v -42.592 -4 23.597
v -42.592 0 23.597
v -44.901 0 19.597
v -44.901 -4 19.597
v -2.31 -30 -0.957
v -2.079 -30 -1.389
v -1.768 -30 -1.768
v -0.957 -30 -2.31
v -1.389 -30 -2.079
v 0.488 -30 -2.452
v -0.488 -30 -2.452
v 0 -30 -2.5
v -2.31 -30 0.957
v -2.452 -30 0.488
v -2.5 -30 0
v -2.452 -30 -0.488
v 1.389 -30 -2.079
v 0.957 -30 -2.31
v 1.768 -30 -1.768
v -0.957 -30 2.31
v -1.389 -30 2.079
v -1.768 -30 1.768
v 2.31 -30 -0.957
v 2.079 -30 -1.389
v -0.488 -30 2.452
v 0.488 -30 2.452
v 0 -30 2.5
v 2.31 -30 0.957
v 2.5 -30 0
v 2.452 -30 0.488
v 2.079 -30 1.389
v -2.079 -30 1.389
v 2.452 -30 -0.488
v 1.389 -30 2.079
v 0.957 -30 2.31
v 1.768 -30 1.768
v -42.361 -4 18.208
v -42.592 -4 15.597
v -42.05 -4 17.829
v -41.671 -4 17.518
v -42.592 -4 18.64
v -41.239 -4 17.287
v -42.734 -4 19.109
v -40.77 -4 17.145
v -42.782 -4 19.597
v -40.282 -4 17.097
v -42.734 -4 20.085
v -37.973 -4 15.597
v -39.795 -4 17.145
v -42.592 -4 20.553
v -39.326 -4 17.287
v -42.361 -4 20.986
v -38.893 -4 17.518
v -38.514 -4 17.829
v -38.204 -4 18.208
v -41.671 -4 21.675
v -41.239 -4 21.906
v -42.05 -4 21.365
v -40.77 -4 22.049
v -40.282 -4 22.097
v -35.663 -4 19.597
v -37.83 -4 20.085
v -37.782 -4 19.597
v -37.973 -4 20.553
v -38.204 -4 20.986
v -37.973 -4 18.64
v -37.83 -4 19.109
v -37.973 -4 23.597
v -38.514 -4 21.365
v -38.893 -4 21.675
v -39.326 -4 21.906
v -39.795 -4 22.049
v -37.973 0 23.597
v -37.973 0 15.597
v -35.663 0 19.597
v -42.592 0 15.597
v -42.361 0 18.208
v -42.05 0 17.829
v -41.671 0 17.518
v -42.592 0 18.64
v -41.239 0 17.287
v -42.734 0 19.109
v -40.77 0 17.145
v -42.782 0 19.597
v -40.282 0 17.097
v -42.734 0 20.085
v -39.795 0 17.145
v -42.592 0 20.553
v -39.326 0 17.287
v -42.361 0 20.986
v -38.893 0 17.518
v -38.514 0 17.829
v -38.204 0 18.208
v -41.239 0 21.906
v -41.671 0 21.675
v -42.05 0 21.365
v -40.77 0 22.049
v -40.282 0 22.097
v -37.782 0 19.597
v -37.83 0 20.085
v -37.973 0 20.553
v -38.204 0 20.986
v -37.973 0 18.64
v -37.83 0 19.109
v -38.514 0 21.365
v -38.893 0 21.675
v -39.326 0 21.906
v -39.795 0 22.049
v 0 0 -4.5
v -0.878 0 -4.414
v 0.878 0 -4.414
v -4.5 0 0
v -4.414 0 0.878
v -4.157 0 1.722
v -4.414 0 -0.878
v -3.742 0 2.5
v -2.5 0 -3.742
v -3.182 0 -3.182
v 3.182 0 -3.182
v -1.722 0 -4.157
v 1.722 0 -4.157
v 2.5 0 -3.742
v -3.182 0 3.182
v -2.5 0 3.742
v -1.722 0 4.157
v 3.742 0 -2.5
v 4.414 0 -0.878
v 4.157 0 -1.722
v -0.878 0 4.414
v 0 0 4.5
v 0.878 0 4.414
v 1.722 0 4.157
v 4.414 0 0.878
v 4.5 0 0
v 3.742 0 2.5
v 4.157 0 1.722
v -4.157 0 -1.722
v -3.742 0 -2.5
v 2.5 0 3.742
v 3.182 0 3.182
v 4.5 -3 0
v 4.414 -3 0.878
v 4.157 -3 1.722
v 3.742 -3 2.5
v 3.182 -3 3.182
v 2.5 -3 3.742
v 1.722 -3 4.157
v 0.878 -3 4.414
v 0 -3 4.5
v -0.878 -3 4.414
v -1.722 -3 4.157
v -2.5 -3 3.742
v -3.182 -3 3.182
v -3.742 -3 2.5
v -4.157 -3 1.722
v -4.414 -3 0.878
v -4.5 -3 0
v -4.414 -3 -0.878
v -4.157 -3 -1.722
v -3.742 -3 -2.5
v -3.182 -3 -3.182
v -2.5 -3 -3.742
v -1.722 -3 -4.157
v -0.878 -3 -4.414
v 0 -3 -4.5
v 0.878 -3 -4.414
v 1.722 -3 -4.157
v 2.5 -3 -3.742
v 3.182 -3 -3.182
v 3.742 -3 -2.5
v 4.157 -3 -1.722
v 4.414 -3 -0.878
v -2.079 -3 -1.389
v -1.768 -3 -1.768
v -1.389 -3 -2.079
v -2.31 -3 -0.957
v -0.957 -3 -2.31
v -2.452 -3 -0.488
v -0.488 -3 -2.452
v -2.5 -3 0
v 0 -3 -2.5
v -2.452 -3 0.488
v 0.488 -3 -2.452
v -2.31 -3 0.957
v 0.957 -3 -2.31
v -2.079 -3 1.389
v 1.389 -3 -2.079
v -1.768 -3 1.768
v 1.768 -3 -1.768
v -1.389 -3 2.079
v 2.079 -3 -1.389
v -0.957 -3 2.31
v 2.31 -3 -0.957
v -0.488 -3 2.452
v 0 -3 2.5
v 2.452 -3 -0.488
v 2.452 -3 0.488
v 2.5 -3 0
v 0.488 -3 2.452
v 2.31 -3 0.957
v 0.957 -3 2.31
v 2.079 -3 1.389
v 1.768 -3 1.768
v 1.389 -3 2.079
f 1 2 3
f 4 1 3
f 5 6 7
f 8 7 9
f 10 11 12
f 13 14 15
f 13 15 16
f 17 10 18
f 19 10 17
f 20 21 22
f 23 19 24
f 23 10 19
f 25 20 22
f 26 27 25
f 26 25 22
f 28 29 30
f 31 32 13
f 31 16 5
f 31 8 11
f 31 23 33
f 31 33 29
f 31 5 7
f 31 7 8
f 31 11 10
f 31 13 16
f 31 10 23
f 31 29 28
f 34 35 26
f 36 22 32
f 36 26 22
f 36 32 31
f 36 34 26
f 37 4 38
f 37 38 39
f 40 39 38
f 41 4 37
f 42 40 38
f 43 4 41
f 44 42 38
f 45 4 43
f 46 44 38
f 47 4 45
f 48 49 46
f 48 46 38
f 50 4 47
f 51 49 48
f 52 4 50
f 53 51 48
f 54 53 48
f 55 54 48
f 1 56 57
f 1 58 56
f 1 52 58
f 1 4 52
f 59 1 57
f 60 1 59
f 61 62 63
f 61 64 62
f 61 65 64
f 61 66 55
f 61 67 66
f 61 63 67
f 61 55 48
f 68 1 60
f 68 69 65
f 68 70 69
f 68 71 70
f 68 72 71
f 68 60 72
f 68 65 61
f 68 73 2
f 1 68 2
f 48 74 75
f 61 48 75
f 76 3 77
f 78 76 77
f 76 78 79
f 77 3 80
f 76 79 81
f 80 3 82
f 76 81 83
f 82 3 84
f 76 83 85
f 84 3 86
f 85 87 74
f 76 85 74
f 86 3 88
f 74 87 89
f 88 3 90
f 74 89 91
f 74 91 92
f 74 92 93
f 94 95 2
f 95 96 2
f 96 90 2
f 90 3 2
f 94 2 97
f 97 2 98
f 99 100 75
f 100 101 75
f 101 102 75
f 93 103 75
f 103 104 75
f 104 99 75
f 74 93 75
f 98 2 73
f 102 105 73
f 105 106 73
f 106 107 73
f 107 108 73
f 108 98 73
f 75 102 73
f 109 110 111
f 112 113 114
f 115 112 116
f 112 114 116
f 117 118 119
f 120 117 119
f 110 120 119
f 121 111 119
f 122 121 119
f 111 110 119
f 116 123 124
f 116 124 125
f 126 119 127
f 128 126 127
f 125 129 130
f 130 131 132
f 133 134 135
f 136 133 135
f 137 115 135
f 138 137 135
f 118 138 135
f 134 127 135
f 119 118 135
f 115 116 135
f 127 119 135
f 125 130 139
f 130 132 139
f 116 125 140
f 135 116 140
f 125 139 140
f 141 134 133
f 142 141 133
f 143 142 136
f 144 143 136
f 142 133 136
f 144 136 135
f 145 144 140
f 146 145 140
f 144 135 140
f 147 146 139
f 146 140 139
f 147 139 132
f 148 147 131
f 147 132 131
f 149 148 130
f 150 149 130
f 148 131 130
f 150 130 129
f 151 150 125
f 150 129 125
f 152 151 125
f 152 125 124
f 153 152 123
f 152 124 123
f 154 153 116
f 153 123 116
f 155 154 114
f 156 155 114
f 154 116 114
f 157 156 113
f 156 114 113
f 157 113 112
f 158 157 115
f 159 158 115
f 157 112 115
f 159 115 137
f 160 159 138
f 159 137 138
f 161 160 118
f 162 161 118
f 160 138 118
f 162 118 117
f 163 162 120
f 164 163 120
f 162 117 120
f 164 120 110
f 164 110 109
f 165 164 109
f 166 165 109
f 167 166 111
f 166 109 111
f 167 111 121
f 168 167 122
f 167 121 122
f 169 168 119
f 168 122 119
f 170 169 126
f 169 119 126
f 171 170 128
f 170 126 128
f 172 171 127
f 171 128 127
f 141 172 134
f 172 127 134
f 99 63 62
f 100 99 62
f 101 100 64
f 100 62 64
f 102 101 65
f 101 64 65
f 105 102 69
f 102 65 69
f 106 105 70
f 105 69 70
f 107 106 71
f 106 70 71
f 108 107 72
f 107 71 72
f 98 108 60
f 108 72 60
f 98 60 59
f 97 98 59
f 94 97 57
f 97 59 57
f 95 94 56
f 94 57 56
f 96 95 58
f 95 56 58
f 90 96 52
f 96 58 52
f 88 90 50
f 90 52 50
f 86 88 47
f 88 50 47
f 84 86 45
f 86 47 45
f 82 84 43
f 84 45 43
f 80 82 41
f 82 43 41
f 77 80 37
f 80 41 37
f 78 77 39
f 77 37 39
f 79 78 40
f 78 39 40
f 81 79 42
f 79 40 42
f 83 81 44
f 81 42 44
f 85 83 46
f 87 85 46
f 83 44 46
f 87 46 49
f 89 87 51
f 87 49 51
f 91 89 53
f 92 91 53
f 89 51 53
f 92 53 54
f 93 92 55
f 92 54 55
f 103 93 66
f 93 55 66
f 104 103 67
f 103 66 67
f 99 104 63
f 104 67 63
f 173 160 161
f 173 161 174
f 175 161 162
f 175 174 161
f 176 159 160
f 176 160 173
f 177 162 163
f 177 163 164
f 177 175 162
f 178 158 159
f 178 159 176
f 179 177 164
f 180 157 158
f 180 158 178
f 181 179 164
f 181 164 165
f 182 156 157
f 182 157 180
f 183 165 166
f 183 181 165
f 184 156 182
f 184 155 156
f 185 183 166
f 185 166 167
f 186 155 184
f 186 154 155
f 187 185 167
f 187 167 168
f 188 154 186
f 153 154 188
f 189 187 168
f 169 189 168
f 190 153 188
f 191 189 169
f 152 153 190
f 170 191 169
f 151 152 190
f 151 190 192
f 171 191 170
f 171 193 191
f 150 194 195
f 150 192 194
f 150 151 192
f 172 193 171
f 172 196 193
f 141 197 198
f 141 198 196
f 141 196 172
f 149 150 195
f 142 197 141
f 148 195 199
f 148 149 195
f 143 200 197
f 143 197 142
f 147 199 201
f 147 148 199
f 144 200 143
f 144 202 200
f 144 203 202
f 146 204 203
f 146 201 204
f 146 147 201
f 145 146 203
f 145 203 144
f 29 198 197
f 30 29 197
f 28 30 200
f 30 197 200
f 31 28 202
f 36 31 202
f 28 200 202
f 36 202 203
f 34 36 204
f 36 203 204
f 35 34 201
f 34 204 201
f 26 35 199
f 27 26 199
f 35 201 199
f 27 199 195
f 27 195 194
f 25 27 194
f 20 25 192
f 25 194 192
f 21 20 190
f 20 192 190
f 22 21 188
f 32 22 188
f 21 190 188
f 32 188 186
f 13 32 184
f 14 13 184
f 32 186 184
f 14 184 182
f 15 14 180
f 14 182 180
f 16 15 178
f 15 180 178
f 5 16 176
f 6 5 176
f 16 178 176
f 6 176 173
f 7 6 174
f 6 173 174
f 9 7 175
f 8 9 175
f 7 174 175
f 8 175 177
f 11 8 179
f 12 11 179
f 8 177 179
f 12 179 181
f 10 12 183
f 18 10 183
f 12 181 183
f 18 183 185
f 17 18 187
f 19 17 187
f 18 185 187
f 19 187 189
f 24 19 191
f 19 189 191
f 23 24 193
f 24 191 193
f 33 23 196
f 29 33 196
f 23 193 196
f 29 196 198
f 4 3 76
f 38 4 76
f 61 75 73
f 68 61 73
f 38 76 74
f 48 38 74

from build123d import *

# Parameters (mm, degrees)
F0_R     = 4.5
F1_DEPTH = 3
F2_R     = 2.5
F3_DEPTH = 27
F5_DEPTH = 4
F6_R     = 2.5
F7_DEPTH = 4


with BuildPart() as f1:
    # F0 (on Front) → F1 (new body)
    with BuildSketch(Plane.XZ):
        Circle(F0_R)
    extrude(amount=F1_DEPTH)

    # F2 (on face) → F3 (join)
    with BuildSketch(Plane.XZ.offset(3)):
        Circle(F2_R)
    extrude(amount=F3_DEPTH)


with BuildPart() as f5:
    # F4 (on Front) → F5 (new body)
    with BuildSketch(Plane.XZ):
        Polygon((-42.5916617033, 15.5967759937), (-37.9728595498, 15.5967759937), (-35.663458473, 19.5967759937), (-37.9728595498, 23.5967759937), (-42.5916617033, 23.5967759937), (-44.9010627801, 19.5967759937), align=None)
    extrude(amount=F5_DEPTH)

    # F6 (on face) → F7 (cut, through all)
    with BuildSketch(Plane.XZ.offset(4)):
        with Locations((-40.2822606266, 19.5967759937)):
            Circle(F6_R)
    extrude(amount=-F7_DEPTH, mode=Mode.SUBTRACT)


solid = Compound([f1.part, f5.part])
